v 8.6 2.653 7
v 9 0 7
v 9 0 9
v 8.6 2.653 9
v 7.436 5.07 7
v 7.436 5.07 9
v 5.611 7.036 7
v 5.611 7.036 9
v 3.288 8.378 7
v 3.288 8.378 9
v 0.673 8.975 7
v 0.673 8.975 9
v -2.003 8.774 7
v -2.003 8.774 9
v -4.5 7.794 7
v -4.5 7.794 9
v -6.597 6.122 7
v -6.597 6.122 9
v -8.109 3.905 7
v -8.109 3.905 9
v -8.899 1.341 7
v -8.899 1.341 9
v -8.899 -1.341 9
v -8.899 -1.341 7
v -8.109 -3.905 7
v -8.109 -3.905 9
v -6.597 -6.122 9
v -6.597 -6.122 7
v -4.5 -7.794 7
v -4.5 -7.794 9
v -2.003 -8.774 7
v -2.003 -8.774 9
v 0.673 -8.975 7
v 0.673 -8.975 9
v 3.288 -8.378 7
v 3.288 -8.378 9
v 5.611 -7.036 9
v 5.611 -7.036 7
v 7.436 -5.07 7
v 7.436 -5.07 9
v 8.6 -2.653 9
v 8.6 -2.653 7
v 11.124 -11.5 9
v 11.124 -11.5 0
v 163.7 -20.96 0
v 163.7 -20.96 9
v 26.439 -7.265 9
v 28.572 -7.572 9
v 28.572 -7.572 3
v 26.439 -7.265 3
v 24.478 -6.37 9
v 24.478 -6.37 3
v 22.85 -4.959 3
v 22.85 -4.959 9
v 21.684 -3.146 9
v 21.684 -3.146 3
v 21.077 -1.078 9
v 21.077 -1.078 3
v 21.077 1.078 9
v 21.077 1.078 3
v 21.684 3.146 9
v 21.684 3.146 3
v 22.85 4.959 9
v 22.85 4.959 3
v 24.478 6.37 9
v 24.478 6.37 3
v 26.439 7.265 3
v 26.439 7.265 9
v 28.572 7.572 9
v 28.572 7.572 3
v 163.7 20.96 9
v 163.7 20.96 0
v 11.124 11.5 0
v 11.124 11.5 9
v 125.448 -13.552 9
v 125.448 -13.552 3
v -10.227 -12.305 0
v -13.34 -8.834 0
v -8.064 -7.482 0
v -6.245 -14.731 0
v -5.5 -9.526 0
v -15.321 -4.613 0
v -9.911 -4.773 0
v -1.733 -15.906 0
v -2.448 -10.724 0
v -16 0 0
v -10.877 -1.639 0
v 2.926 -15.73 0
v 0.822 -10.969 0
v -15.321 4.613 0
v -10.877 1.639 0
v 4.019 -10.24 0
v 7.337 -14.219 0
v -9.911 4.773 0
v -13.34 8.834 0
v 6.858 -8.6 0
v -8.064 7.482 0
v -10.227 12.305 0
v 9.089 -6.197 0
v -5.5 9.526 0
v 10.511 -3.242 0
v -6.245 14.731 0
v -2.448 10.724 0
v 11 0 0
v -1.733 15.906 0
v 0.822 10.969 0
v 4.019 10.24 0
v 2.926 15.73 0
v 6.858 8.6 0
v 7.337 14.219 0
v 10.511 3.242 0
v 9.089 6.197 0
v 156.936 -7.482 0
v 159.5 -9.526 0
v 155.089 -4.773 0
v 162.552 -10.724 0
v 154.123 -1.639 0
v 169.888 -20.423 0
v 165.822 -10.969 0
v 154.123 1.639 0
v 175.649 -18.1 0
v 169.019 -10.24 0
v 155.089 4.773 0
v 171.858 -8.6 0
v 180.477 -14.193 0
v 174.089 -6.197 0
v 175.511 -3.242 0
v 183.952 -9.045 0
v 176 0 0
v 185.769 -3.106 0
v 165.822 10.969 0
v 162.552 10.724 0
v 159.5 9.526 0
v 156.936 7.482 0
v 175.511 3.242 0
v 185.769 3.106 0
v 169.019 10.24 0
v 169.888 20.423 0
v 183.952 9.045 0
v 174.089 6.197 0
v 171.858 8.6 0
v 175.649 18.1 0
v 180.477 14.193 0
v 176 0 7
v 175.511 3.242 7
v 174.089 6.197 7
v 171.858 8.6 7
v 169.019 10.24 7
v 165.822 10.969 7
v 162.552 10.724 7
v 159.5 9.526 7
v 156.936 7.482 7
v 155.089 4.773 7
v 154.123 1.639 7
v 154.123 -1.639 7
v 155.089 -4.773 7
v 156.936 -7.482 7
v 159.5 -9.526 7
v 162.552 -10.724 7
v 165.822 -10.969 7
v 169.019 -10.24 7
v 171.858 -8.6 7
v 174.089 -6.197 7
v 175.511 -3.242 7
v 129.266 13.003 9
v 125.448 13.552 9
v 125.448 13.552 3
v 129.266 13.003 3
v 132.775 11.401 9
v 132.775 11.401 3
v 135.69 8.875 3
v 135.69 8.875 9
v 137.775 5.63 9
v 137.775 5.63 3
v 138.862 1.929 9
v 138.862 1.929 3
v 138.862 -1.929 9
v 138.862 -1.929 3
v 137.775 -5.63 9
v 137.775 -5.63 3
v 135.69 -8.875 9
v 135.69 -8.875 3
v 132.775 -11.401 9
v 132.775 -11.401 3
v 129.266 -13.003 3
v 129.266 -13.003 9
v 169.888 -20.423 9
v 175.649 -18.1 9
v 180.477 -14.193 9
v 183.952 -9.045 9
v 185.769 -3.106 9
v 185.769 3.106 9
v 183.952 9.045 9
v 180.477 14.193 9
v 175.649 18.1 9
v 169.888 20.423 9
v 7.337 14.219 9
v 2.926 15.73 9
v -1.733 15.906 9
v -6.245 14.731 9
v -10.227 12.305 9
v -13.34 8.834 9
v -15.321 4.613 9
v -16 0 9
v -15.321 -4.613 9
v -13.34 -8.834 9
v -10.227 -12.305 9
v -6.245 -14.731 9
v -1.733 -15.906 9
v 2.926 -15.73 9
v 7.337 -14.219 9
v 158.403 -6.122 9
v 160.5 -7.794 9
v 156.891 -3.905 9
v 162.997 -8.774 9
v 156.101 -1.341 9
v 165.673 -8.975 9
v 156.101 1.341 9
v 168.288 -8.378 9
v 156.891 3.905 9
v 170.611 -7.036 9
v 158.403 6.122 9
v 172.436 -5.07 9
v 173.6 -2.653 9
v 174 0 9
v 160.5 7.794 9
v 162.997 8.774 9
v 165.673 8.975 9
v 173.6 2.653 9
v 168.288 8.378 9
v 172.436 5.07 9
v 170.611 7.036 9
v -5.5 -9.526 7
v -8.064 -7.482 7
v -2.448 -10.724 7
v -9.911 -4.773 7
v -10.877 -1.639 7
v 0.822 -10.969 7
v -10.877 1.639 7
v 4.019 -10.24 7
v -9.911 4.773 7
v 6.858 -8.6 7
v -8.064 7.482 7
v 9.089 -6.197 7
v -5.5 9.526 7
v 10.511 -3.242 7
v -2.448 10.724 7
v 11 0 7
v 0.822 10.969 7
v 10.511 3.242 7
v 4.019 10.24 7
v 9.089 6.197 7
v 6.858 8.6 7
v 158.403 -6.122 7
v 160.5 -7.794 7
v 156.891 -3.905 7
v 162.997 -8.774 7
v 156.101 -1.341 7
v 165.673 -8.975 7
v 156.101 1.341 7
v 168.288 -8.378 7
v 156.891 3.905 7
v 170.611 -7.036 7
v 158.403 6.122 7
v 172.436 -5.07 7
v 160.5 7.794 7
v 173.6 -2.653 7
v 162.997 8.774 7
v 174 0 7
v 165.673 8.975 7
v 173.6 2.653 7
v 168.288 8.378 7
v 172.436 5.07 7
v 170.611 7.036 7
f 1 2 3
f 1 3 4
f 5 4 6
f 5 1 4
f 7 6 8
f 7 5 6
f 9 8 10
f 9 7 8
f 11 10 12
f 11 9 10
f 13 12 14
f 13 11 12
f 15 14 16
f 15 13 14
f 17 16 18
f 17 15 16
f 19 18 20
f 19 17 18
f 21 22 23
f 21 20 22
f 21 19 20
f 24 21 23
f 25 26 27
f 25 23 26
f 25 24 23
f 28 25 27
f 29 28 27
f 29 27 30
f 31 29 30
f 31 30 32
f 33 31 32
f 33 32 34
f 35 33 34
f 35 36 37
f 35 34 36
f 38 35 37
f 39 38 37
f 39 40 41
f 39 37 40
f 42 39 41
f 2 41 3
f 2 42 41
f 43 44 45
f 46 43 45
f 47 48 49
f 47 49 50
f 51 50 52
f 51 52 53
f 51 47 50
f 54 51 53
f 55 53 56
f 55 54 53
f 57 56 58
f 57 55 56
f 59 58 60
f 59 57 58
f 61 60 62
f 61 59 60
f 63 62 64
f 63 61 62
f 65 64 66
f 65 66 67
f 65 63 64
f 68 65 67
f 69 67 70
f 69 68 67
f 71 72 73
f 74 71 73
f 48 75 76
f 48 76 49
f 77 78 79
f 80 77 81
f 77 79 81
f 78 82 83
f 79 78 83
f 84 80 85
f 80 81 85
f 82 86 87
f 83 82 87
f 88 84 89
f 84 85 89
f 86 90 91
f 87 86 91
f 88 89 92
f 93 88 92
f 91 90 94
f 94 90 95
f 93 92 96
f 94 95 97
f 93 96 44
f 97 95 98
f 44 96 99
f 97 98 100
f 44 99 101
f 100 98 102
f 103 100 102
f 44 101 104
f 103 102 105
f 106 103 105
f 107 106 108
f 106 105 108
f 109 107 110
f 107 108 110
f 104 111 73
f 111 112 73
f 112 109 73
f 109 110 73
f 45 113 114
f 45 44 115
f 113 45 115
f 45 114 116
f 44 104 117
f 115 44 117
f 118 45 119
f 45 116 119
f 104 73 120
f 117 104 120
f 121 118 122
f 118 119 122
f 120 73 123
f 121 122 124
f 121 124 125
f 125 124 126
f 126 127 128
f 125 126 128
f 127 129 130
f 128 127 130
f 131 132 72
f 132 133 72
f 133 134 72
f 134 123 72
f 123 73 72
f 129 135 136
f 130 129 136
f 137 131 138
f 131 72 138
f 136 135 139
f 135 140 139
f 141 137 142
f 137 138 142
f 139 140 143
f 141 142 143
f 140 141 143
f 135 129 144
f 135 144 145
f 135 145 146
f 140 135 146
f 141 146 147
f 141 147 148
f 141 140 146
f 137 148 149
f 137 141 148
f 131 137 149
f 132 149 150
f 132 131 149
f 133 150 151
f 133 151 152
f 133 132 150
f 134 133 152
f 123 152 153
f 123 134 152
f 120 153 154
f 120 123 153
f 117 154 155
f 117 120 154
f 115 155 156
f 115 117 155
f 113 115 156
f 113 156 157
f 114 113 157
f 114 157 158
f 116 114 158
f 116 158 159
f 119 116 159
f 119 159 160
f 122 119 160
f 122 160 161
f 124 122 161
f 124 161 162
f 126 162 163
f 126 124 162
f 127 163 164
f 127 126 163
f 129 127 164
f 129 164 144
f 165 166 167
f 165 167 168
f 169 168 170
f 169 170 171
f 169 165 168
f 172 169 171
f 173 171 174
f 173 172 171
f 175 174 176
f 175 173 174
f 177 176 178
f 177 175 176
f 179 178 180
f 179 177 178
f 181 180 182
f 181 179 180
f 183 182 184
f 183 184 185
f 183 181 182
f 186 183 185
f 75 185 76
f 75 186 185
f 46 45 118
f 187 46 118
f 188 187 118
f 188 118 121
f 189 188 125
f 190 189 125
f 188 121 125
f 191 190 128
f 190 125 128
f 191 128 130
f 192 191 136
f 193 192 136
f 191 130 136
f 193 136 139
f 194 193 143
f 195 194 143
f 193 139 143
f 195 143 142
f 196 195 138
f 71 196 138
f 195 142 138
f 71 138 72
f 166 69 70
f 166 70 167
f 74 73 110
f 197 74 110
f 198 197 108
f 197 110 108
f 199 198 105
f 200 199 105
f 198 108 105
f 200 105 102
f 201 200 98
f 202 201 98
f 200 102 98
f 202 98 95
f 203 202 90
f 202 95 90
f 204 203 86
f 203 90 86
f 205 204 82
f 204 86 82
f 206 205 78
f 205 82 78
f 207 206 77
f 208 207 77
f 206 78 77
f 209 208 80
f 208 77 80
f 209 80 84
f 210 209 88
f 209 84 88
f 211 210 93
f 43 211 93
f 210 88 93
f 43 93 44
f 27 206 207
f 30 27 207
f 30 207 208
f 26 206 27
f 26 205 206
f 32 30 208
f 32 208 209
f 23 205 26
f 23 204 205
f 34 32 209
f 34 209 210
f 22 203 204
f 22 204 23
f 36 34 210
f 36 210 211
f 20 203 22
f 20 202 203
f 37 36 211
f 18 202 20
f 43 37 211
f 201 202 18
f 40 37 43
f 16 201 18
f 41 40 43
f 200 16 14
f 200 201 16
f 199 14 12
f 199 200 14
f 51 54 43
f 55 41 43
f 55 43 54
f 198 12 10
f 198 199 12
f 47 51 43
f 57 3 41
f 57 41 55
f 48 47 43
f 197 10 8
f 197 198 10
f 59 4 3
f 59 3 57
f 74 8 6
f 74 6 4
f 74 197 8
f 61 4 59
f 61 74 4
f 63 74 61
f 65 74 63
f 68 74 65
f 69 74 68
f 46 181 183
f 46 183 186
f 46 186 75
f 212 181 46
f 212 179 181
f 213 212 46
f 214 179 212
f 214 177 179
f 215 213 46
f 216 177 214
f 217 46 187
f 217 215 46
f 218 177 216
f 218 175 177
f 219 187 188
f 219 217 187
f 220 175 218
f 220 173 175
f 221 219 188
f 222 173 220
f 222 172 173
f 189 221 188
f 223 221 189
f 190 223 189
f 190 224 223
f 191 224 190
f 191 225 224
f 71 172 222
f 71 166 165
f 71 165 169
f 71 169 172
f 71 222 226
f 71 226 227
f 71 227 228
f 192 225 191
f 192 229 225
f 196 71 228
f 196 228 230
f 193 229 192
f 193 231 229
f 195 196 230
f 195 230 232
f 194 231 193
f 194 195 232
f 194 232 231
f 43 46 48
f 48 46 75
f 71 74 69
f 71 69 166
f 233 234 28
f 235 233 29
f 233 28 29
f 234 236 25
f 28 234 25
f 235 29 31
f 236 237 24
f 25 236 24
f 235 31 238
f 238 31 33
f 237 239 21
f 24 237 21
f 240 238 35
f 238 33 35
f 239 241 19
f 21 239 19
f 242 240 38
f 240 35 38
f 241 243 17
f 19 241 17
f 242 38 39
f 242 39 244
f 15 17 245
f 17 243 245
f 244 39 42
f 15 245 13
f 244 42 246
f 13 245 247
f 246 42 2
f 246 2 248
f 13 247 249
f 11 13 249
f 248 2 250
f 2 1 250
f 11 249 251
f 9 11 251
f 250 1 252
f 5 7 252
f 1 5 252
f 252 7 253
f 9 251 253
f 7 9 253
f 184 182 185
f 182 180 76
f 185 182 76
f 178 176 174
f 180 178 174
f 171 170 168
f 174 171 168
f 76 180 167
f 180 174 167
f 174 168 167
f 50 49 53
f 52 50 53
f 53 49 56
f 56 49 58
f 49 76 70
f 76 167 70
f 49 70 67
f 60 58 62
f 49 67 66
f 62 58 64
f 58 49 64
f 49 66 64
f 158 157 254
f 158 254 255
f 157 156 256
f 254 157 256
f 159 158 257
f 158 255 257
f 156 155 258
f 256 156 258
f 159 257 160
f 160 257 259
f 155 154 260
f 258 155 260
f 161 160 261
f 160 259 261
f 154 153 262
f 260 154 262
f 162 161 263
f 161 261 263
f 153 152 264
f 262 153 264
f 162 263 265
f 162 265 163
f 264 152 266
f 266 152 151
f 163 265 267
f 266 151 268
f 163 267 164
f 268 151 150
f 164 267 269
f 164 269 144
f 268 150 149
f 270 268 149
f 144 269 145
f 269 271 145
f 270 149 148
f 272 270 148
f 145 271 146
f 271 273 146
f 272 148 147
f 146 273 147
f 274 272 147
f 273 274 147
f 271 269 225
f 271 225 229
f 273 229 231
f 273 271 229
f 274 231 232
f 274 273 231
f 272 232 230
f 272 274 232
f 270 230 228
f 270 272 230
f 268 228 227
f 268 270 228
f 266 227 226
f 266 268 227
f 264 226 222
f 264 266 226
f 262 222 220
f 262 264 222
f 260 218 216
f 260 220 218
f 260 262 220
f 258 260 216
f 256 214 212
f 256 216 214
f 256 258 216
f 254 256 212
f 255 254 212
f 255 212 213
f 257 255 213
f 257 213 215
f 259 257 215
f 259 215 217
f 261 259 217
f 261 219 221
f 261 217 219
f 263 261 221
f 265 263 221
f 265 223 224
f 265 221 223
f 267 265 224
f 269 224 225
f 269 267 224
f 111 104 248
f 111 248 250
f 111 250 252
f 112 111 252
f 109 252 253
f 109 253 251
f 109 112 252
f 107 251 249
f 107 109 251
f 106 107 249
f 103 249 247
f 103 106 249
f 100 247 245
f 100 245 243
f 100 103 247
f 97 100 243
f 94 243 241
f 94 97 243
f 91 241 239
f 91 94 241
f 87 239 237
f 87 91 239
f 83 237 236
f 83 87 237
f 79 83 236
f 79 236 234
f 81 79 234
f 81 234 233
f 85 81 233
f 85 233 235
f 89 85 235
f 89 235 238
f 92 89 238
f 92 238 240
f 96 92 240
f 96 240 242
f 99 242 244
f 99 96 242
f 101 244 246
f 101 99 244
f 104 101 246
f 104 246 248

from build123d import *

# Parameters (mm, degrees)
BOSS_EXTRUDE1_DEPTH = 9
SKETCH6_15_R        = 9
CUT_EXTRUDE1_DEPTH  = 188.397972241
SKETCH6_17_R        = 11
CUT_EXTRUDE2_DEPTH  = 7
CUT_EXTRUDE3_START  = 9
CUT_EXTRUDE3_DEPTH  = 6


with BuildPart() as part:
    # Sketch6 → Boss-Extrude1 (new body)
    with BuildSketch(Plane.XY):
        with BuildLine():
            Line((11.124297731, -11.5), (163.700491182, -20.95975374))
            ThreePointArc((163.700491182, -20.95975374), (186, 0), (163.700491182, 20.95975374))
            Line((163.700491182, 20.95975374), (11.124297731, 11.5))
            ThreePointArc((11.124297731, 11.5), (-16, 0), (11.124297731, -11.5))
        make_face()
    extrude(amount=BOSS_EXTRUDE1_DEPTH)

    # Sketch6<15> → Cut-Extrude1 (cut, through all)
    with BuildSketch(Plane.XY):
        with Locations((165, 0)):
            Circle(SKETCH6_15_R)
        Circle(SKETCH6_15_R)
    extrude(amount=CUT_EXTRUDE1_DEPTH, mode=Mode.SUBTRACT)

    # Sketch6<17> → Cut-Extrude2 (cut)
    with BuildSketch(Plane.XY):
        with Locations((165, 0)):
            Circle(SKETCH6_17_R)
        Circle(SKETCH6_17_R)
    extrude(amount=CUT_EXTRUDE2_DEPTH, mode=Mode.SUBTRACT)

    # Sketch6<18> → Cut-Extrude3 (cut)
    with BuildSketch(Plane.XY.offset(CUT_EXTRUDE3_START)):
        with BuildLine():
            Line((28.572170682, 7.572170682), (125.447559308, 13.552440692))
            ThreePointArc((125.447559308, 13.552440692), (139, 0), (125.447559308, -13.552440692))
            Line((125.447559308, -13.552440692), (28.572170682, -7.572170682))
            ThreePointArc((28.572170682, -7.572170682), (21, 0), (28.572170682, 7.572170682))
        make_face()
    extrude(amount=-CUT_EXTRUDE3_DEPTH, mode=Mode.SUBTRACT)


solid = part.part
